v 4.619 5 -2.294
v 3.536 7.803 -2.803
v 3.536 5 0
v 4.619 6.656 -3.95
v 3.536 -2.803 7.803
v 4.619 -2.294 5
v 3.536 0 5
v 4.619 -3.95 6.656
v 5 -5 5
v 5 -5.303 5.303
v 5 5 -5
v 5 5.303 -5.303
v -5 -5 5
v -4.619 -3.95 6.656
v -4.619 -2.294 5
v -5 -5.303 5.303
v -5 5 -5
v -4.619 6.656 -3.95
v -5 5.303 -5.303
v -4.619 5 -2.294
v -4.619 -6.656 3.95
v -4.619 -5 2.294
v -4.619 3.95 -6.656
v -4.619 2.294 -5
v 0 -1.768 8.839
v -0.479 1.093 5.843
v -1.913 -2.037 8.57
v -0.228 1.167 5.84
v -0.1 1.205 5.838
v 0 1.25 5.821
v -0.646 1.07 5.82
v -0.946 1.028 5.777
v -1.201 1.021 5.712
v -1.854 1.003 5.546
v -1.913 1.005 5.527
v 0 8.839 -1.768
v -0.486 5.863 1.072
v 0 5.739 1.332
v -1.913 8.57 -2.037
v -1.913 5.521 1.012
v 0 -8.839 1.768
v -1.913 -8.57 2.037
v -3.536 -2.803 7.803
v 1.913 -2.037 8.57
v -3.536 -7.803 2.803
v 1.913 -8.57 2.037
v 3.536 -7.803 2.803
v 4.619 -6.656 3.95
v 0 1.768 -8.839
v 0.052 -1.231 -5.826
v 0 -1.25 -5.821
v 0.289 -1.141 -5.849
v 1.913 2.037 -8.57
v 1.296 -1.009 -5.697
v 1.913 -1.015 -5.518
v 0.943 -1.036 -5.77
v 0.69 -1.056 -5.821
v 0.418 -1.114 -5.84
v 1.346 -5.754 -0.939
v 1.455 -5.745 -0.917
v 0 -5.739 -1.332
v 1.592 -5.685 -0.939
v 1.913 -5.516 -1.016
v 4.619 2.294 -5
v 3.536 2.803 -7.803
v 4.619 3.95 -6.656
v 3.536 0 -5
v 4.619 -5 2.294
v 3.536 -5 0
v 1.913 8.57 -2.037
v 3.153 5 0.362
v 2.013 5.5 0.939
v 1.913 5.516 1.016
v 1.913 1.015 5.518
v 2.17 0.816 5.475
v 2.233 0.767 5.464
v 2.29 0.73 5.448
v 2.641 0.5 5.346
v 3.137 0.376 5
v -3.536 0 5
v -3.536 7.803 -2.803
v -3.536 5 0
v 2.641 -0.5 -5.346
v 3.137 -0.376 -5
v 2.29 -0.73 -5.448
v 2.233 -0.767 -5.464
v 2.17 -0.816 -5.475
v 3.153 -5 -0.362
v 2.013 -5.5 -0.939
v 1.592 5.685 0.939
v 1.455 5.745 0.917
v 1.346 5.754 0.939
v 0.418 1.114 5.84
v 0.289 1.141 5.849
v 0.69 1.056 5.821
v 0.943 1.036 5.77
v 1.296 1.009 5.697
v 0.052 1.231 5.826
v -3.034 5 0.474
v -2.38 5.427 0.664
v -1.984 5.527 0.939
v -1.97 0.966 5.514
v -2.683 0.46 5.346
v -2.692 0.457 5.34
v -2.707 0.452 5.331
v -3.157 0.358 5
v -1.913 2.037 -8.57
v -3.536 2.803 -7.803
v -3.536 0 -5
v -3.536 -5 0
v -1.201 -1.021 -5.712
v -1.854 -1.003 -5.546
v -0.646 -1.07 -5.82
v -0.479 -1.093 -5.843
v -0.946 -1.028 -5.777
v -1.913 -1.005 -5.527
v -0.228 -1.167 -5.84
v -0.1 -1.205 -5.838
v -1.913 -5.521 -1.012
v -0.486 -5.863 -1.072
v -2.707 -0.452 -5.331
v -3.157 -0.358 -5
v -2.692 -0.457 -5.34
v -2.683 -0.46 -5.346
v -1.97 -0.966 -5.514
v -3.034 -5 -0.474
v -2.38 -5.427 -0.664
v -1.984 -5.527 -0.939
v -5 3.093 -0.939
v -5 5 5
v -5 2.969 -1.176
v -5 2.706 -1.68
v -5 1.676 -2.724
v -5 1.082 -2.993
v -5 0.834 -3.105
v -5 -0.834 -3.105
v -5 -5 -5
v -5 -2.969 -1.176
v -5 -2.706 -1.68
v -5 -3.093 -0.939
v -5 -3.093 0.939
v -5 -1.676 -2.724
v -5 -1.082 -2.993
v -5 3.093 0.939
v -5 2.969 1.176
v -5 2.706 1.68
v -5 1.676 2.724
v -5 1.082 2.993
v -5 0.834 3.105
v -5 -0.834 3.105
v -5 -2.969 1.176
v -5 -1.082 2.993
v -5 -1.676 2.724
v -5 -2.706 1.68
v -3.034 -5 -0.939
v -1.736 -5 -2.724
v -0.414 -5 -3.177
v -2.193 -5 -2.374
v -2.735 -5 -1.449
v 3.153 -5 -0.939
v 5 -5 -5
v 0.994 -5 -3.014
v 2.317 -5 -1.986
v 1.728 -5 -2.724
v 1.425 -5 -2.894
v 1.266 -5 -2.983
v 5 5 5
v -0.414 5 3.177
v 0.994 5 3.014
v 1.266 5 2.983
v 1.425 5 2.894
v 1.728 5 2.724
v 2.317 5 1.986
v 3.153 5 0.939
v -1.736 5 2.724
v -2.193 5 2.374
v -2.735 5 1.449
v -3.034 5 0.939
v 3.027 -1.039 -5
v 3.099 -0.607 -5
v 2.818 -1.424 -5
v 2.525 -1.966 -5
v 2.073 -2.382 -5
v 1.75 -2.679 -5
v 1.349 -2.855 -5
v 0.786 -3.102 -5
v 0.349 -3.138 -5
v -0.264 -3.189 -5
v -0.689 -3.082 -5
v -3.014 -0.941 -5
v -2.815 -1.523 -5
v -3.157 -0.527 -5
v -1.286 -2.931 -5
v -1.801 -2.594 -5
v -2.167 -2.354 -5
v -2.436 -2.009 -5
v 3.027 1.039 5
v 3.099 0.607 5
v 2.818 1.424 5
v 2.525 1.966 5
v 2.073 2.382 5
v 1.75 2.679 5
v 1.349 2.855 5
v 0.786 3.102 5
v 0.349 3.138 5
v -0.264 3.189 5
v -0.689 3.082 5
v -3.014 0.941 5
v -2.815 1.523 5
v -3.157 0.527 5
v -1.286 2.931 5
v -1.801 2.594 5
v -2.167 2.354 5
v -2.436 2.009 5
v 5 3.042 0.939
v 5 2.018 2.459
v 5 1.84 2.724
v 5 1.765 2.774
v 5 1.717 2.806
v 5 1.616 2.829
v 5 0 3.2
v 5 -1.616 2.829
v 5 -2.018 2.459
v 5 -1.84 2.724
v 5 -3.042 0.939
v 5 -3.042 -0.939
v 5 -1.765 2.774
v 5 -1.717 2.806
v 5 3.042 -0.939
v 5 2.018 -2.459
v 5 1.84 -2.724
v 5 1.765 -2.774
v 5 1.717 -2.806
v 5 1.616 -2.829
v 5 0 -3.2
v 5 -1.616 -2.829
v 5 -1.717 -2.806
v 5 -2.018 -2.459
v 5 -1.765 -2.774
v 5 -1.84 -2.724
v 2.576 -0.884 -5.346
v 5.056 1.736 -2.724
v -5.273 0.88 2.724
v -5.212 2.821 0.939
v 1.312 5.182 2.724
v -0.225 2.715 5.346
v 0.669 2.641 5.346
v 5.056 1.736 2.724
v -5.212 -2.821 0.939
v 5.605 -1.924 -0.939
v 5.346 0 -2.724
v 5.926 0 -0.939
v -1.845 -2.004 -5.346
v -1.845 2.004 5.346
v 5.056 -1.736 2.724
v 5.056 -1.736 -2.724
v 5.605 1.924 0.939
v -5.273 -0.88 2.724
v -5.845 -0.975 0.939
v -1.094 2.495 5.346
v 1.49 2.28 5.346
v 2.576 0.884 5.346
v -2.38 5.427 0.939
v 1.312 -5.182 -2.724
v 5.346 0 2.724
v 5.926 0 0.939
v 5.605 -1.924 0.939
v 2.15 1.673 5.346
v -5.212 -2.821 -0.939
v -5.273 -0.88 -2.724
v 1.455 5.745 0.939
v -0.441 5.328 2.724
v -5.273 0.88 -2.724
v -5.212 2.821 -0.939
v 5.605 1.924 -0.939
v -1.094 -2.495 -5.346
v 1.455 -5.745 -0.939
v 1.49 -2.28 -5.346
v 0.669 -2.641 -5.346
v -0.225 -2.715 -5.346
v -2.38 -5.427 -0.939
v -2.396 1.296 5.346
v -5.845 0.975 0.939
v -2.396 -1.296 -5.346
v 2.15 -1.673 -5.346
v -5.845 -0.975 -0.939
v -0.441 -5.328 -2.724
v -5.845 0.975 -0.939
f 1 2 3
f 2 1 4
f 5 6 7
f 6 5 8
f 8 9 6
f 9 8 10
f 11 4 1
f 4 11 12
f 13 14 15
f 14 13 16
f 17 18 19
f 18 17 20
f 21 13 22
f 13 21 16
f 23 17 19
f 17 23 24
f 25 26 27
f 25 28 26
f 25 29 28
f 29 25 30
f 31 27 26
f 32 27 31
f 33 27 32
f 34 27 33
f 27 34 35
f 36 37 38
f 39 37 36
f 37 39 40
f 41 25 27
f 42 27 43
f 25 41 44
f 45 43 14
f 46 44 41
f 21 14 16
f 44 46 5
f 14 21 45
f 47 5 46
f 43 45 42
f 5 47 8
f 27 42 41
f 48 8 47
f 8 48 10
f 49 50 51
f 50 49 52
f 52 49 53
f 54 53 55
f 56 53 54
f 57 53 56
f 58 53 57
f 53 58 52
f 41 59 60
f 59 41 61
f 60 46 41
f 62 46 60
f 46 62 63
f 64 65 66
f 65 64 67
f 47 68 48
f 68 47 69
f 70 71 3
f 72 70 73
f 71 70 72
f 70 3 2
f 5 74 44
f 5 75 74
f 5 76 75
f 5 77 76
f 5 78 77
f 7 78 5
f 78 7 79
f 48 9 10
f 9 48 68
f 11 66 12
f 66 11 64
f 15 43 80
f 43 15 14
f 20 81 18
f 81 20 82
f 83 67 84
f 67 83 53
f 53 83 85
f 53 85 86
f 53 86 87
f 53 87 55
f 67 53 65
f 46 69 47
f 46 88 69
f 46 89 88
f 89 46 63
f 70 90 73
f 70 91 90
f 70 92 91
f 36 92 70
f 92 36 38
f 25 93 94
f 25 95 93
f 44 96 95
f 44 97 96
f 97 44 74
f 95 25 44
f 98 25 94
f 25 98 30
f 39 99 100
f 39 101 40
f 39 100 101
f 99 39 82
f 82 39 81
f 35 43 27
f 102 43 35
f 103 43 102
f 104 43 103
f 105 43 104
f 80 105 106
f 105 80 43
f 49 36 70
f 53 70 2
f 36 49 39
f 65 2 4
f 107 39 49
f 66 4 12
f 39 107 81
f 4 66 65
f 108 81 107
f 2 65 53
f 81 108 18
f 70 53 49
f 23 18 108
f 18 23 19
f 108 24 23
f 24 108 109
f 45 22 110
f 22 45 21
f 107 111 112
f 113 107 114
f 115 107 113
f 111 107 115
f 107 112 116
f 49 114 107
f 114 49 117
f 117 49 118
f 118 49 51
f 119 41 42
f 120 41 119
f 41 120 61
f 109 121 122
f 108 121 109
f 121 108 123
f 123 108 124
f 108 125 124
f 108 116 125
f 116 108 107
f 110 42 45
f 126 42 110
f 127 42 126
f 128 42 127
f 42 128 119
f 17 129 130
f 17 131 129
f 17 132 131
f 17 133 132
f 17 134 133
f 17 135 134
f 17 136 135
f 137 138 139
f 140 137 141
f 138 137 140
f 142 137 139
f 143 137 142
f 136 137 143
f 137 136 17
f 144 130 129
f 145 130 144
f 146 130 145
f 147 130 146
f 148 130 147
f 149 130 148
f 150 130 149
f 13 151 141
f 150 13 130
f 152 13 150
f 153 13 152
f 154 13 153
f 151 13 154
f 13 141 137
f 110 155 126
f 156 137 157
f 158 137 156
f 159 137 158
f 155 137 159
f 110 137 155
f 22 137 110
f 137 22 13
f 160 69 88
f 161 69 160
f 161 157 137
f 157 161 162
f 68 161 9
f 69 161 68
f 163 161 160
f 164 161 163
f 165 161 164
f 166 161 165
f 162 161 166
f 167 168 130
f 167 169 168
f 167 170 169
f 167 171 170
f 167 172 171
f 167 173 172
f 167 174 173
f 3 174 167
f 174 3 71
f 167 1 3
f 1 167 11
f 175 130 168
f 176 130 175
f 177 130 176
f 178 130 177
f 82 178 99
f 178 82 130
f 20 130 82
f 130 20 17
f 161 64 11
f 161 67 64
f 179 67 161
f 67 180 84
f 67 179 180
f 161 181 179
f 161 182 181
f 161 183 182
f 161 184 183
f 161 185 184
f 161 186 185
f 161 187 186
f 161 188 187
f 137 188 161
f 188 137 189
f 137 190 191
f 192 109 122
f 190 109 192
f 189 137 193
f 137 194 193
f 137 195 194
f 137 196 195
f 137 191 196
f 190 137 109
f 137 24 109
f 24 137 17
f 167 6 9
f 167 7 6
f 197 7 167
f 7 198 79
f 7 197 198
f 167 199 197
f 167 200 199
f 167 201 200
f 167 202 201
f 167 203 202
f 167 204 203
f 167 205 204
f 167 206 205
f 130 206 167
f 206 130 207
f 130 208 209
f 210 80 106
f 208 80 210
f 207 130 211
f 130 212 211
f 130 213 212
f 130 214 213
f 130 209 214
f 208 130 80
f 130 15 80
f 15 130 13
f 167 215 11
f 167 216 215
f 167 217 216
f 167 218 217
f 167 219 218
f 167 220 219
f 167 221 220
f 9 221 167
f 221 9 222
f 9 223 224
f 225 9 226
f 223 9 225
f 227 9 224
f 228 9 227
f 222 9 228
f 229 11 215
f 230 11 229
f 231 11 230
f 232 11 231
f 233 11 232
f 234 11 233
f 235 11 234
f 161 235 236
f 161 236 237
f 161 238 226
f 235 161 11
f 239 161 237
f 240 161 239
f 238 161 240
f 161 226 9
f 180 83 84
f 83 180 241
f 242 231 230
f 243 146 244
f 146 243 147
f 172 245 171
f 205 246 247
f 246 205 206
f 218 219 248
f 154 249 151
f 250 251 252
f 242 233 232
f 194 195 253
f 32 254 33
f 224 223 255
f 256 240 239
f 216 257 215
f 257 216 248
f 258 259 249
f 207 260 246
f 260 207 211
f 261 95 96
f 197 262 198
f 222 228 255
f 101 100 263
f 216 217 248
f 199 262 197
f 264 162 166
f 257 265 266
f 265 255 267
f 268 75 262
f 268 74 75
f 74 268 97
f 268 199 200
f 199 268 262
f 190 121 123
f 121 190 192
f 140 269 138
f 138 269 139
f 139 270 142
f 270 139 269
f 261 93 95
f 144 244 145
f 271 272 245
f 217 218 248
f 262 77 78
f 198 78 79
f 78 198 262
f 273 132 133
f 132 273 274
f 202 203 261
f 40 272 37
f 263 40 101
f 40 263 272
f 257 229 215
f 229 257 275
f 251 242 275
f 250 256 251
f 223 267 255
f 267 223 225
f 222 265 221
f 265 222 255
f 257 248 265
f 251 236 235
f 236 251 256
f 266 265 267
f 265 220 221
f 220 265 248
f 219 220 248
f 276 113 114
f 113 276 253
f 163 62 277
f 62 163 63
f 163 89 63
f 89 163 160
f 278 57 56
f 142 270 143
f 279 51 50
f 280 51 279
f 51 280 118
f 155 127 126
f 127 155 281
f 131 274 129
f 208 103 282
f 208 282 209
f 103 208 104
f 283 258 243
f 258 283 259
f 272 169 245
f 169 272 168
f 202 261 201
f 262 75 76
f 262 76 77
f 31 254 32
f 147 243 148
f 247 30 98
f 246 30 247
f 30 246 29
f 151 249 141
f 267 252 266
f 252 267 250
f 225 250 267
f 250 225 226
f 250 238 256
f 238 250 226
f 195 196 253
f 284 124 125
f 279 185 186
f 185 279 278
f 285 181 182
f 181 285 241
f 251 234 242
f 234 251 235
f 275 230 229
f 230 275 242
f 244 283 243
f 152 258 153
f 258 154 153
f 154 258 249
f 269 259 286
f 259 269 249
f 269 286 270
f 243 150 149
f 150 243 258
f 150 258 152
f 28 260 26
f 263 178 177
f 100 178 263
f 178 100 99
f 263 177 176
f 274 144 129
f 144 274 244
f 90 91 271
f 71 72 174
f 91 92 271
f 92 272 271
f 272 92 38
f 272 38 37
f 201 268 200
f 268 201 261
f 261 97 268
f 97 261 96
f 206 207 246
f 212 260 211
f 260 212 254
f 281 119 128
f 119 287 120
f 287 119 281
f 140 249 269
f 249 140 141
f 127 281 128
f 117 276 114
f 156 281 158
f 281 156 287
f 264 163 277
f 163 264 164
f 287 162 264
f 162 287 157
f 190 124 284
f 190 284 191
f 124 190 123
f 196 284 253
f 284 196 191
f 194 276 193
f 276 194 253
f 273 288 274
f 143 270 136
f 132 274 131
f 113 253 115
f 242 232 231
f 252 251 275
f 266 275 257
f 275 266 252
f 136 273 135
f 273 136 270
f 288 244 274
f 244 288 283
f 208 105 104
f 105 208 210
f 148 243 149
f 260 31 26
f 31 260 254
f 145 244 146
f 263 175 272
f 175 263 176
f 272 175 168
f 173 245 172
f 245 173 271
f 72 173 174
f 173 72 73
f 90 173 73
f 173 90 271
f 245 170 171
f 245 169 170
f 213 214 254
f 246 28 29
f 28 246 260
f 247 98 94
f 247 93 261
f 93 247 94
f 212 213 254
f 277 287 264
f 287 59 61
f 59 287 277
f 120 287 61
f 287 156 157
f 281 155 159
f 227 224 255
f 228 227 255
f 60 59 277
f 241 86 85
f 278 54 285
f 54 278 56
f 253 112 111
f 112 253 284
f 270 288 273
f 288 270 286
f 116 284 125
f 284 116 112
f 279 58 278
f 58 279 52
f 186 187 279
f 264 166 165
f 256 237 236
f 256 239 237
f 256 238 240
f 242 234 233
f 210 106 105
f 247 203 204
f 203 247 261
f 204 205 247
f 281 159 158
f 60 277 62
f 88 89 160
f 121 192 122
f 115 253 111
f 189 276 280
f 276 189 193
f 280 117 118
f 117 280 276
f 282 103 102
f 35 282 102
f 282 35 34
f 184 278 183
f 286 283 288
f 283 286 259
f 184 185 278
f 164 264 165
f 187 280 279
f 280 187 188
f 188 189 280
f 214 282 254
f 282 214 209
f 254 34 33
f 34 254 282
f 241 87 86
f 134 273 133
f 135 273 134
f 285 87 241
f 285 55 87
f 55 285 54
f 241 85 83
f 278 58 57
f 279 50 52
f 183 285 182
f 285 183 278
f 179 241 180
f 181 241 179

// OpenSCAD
// Size of the Cube (all directions)
cuSize = 10;

// The diameter of the Cylinder
cyDia = 10;

// The height of the Cylinder
cyHei = 15;

// The radius of the Sphere
sphereRadius = 6;

// X-Rotation of the Cylinder and Cube
rX = 45;

// Create Sphere and rotate Cylinder and Cube by 'rX'
// Then rotate Cube again by 'rX'
// The inner rotation does not need {} around
// if you only rotate one shape
sphere(r = sphereRadius);
rotate([rX, 0, 0]){
    cylinder(d = cyDia, h = cyHei, center = true);
    rotate([rX, 0, 0])
        cube(size = [cuSize, cuSize, cuSize], center = true);        
}
